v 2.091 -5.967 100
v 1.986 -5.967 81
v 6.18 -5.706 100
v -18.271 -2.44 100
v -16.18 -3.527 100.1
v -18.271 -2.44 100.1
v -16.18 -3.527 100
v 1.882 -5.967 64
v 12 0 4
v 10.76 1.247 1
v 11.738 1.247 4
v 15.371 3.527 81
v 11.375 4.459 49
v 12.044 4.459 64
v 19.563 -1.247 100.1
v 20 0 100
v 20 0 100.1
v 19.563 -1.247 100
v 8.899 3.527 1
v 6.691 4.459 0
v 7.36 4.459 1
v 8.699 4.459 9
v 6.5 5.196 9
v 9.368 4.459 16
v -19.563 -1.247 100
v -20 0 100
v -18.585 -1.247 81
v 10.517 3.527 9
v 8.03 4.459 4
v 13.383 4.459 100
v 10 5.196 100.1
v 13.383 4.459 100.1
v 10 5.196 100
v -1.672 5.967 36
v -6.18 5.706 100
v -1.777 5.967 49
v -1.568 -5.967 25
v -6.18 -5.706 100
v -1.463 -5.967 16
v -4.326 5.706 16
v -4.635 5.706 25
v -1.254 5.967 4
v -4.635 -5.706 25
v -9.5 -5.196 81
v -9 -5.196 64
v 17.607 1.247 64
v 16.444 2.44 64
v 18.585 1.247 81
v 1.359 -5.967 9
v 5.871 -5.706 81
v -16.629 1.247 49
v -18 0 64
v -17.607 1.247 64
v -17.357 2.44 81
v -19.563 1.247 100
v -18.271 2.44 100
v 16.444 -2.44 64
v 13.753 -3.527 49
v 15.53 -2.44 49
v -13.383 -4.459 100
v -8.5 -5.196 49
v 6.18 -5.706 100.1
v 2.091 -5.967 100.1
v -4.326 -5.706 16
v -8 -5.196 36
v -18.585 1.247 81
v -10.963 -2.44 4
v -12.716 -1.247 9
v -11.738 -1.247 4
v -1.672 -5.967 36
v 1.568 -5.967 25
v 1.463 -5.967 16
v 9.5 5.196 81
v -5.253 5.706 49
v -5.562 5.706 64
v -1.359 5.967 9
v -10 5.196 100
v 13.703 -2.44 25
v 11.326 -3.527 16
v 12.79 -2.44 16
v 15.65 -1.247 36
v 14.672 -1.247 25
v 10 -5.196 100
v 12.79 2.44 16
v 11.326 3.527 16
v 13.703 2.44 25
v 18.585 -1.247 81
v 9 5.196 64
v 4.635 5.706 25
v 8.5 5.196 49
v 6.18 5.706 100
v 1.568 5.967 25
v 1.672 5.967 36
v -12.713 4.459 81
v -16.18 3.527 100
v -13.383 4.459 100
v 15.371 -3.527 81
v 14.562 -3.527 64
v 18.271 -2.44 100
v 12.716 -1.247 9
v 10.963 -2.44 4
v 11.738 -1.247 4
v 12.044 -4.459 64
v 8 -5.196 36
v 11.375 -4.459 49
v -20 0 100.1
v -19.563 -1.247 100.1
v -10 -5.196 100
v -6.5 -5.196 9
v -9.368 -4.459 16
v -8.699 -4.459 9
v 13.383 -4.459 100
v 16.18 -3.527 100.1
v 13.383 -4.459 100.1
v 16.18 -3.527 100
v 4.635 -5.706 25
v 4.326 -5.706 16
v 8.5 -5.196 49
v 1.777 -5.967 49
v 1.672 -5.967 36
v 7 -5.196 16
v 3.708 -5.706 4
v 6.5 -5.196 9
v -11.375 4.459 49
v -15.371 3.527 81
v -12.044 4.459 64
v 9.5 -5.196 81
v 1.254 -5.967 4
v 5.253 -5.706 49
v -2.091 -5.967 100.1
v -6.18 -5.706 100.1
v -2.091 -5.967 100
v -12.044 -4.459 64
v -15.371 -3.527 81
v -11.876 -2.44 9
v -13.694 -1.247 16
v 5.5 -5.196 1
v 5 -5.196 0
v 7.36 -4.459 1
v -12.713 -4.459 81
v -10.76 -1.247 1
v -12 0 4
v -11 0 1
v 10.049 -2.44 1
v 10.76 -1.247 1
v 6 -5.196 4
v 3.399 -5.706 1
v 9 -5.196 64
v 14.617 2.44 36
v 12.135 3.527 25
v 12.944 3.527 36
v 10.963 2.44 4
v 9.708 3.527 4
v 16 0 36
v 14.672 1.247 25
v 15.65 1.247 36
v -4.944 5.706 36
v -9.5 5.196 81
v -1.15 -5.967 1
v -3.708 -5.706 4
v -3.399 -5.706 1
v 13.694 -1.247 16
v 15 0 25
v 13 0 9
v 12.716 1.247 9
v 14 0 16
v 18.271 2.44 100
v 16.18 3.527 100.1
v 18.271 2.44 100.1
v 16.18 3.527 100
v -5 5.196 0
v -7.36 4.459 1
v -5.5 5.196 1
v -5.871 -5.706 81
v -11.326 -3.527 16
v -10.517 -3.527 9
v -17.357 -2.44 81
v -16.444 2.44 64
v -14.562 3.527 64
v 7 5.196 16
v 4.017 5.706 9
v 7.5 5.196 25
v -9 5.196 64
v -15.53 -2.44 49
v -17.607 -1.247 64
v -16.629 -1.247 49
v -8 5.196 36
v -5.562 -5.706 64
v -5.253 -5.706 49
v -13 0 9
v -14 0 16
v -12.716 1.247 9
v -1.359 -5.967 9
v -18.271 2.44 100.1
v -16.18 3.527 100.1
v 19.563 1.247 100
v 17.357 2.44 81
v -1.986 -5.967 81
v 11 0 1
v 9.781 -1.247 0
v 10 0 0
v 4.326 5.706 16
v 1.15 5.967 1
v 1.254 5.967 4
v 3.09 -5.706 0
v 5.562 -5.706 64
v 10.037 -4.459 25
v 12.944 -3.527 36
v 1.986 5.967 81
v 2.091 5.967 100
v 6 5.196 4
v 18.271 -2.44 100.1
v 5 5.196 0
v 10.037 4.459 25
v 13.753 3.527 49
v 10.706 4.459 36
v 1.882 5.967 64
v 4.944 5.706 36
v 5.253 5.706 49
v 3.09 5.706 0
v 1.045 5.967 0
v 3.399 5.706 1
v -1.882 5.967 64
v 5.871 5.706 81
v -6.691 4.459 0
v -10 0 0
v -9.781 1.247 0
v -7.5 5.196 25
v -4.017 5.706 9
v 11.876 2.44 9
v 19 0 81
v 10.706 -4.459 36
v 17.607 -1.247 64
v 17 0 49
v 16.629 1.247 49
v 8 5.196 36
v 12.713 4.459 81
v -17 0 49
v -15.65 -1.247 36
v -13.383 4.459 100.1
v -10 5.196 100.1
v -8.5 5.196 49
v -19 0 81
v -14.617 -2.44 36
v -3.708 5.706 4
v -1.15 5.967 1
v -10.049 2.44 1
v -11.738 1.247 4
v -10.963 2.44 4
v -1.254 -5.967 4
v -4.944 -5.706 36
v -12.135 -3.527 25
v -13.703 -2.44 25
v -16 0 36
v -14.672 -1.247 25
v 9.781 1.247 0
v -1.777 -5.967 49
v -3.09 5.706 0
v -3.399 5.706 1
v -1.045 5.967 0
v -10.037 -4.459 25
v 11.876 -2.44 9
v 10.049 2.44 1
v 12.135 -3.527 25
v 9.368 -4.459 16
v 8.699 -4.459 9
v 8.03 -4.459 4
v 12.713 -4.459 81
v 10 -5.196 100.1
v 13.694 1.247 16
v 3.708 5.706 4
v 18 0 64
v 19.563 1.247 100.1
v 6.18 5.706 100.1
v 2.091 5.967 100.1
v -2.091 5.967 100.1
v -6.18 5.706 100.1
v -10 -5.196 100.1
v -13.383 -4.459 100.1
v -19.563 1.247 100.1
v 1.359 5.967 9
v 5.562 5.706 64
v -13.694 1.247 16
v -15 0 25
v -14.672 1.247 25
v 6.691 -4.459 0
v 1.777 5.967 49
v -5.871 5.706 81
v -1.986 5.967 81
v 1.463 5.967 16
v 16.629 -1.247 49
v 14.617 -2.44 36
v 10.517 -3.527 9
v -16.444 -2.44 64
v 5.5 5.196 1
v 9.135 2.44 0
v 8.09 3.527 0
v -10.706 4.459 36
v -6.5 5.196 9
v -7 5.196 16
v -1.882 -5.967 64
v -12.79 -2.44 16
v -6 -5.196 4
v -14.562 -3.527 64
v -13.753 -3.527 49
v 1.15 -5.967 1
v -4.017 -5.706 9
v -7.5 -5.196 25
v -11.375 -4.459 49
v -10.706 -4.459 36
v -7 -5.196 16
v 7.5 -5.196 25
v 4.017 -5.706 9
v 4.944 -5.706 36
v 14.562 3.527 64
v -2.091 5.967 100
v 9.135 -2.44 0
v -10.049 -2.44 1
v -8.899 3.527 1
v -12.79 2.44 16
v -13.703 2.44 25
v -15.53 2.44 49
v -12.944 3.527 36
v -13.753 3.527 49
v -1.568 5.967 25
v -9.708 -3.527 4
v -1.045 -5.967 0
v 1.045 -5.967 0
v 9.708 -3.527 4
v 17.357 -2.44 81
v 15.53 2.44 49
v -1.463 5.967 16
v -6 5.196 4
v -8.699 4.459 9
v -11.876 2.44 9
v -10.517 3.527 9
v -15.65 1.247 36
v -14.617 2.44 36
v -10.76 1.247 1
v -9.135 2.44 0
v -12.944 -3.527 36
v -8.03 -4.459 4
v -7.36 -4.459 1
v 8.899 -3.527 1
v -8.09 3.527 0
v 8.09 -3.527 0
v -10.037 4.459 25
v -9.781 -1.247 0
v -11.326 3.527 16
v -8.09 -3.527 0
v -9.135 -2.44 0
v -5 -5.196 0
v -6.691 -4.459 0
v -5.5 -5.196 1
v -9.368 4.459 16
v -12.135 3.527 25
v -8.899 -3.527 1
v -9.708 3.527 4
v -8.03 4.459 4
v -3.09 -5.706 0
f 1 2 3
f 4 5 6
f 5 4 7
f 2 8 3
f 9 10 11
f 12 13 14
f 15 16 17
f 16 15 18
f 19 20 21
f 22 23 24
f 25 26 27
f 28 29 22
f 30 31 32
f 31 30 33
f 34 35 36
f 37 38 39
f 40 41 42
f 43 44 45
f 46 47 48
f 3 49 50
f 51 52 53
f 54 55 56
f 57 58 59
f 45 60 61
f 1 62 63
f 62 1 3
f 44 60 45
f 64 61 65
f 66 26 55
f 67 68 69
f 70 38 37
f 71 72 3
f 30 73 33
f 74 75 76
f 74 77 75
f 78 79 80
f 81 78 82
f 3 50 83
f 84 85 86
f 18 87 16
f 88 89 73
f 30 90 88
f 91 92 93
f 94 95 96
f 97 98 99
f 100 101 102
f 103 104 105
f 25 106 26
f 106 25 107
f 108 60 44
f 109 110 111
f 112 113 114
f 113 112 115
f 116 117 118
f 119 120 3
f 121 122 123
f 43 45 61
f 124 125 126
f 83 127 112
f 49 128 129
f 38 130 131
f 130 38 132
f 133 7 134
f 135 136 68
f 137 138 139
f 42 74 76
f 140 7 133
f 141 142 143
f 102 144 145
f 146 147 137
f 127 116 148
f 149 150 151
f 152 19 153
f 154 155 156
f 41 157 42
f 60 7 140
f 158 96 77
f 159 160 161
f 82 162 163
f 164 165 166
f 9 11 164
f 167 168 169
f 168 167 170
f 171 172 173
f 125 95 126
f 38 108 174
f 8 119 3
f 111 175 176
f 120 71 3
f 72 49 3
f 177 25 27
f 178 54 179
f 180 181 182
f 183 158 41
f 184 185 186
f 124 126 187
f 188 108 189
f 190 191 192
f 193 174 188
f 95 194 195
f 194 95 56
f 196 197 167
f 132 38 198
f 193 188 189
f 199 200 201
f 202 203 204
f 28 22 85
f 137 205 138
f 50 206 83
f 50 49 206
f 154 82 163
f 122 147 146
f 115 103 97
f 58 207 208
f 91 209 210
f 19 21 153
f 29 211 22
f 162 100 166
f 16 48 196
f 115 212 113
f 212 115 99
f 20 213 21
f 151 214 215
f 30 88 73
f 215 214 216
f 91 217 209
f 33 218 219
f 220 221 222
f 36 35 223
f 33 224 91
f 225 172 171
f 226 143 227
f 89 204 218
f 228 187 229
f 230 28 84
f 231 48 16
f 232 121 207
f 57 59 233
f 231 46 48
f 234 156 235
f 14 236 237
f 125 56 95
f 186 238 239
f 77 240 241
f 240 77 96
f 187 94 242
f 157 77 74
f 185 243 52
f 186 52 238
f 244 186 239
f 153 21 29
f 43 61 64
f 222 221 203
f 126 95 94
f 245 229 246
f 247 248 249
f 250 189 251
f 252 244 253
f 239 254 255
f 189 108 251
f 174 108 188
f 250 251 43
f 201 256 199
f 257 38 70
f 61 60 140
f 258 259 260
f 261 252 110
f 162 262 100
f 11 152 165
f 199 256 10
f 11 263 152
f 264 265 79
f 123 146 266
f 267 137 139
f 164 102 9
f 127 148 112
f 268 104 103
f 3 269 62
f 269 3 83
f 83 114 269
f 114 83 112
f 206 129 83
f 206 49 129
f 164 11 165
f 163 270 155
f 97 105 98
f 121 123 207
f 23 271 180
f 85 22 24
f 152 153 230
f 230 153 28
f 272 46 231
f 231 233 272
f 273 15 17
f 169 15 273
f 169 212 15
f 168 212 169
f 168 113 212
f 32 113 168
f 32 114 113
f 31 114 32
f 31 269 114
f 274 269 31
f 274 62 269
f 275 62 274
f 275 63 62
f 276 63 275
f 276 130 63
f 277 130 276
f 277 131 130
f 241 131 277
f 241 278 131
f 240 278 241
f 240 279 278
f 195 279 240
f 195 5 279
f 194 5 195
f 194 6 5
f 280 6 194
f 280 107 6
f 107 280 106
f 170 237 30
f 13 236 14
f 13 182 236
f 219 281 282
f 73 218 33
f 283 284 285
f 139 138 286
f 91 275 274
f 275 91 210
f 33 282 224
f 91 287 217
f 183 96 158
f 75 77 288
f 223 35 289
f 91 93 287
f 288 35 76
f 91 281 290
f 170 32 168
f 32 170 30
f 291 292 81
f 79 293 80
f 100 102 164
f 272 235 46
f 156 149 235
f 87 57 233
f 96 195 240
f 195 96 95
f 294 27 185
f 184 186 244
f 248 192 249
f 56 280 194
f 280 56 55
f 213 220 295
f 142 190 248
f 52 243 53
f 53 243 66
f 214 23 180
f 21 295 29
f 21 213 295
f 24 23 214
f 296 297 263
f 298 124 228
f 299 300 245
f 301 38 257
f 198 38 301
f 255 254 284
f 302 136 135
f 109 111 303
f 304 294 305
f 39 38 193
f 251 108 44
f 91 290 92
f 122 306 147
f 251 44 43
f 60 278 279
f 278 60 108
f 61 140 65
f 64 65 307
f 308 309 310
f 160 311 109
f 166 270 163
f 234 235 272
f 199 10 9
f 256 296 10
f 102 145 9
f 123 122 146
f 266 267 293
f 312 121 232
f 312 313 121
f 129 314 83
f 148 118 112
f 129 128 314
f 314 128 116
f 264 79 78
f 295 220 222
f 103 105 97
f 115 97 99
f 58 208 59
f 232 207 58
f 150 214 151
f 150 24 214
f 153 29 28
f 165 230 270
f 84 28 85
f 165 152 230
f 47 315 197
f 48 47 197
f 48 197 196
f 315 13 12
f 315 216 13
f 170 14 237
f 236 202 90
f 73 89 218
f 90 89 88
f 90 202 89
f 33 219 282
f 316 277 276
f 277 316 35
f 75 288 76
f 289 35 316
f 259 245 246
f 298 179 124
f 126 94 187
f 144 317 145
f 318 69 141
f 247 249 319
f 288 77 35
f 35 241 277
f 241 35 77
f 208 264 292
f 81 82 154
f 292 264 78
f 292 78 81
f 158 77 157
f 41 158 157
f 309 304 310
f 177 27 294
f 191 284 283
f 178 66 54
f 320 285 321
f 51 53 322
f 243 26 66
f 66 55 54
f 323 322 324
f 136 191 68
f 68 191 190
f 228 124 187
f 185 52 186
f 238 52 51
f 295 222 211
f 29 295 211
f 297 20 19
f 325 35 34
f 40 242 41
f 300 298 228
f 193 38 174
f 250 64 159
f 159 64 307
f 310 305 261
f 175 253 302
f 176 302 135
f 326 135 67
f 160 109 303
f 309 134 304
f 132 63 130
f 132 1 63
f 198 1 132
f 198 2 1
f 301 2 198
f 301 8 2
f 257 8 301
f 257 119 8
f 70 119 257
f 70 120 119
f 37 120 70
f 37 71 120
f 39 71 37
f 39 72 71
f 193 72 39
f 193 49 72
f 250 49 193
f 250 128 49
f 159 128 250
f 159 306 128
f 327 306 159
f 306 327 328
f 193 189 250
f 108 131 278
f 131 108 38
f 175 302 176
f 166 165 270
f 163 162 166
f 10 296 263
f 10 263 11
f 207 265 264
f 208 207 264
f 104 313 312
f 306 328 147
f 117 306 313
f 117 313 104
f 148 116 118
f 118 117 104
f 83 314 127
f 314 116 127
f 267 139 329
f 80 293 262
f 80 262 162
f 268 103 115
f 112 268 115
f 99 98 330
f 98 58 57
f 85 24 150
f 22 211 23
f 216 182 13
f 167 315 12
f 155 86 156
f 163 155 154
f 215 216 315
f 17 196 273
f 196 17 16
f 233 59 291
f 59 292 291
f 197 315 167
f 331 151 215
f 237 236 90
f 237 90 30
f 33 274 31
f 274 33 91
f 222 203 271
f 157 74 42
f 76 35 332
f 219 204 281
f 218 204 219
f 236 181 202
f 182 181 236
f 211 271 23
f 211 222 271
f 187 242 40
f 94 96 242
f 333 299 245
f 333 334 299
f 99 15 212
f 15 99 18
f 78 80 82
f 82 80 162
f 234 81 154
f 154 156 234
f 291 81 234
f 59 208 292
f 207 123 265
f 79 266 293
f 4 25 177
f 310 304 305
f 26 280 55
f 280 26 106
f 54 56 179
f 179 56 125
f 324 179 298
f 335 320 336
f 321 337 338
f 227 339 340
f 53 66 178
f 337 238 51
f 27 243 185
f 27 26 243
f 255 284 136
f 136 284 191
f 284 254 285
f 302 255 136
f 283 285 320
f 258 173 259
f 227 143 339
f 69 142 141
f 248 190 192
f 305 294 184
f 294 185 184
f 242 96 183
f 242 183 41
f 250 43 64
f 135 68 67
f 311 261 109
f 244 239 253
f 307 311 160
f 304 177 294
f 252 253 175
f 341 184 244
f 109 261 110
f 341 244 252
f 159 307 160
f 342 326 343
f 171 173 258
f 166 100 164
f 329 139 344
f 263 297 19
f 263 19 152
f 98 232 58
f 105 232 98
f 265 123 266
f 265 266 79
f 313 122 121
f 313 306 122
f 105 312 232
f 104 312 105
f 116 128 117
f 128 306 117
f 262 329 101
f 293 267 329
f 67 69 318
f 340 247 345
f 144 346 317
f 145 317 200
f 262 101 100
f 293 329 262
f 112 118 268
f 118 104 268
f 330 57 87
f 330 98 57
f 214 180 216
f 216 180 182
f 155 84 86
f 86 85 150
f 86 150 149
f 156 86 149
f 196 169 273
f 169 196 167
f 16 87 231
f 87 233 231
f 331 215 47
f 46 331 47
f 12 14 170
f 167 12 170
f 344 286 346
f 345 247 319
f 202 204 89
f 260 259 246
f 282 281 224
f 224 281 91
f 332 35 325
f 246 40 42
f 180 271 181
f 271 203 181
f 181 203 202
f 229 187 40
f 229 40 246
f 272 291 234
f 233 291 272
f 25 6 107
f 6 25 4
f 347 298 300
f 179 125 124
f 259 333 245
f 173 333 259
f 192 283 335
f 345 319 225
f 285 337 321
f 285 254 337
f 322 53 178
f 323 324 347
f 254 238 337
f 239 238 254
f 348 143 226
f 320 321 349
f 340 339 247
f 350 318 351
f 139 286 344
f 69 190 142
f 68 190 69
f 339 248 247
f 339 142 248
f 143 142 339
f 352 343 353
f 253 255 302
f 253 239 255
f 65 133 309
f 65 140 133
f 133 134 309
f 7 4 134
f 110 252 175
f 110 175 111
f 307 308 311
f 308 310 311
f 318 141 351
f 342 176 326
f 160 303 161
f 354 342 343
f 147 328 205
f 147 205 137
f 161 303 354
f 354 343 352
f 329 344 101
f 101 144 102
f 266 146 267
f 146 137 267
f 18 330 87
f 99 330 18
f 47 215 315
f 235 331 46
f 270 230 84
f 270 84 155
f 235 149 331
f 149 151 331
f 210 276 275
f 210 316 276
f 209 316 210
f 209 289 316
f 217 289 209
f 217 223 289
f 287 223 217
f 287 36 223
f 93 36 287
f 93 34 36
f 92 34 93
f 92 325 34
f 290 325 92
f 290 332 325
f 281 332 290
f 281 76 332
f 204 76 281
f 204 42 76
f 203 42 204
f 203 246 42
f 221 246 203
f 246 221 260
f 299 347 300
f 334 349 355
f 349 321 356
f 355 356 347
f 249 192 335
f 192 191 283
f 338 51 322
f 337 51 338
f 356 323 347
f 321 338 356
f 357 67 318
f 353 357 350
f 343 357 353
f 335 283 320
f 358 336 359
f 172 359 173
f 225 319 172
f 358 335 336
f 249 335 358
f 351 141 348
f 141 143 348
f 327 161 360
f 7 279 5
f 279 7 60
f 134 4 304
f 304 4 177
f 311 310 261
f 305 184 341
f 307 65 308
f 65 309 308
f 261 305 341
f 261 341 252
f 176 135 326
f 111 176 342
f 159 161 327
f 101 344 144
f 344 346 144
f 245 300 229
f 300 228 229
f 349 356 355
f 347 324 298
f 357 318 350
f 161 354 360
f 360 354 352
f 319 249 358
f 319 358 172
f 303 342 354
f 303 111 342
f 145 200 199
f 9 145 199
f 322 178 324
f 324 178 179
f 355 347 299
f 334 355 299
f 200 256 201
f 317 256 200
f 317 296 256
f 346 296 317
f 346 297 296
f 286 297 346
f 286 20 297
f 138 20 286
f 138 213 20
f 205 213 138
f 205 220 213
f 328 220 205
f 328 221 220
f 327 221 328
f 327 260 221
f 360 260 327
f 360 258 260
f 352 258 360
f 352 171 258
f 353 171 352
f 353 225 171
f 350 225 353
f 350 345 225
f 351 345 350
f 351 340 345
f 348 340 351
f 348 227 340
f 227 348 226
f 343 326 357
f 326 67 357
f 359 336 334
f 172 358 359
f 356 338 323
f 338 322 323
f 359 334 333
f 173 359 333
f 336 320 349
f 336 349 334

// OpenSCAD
/**
 * Test models for my first quad copter
 *
 * Created by Diego Viejo 
 * 09/May/2015
 *
 */

//oval(w=10, h=5, height=2);
step = 1;
nestedHull()
{
for(i = [0: step: step*10])
    translate([0, 0, i*i])
        oval(w=10+i, h=6, height=0.1);
}

module oval(w,h, height, center = false) {
 scale([1, h/w, 1]) cylinder(h=height, r=w, center=center);
}


//auxiliary method
module nestedHull()
{
  for(i=[0:$children-2])
    hull()
    {
      children(i);
      children(i+1);
    }
}
